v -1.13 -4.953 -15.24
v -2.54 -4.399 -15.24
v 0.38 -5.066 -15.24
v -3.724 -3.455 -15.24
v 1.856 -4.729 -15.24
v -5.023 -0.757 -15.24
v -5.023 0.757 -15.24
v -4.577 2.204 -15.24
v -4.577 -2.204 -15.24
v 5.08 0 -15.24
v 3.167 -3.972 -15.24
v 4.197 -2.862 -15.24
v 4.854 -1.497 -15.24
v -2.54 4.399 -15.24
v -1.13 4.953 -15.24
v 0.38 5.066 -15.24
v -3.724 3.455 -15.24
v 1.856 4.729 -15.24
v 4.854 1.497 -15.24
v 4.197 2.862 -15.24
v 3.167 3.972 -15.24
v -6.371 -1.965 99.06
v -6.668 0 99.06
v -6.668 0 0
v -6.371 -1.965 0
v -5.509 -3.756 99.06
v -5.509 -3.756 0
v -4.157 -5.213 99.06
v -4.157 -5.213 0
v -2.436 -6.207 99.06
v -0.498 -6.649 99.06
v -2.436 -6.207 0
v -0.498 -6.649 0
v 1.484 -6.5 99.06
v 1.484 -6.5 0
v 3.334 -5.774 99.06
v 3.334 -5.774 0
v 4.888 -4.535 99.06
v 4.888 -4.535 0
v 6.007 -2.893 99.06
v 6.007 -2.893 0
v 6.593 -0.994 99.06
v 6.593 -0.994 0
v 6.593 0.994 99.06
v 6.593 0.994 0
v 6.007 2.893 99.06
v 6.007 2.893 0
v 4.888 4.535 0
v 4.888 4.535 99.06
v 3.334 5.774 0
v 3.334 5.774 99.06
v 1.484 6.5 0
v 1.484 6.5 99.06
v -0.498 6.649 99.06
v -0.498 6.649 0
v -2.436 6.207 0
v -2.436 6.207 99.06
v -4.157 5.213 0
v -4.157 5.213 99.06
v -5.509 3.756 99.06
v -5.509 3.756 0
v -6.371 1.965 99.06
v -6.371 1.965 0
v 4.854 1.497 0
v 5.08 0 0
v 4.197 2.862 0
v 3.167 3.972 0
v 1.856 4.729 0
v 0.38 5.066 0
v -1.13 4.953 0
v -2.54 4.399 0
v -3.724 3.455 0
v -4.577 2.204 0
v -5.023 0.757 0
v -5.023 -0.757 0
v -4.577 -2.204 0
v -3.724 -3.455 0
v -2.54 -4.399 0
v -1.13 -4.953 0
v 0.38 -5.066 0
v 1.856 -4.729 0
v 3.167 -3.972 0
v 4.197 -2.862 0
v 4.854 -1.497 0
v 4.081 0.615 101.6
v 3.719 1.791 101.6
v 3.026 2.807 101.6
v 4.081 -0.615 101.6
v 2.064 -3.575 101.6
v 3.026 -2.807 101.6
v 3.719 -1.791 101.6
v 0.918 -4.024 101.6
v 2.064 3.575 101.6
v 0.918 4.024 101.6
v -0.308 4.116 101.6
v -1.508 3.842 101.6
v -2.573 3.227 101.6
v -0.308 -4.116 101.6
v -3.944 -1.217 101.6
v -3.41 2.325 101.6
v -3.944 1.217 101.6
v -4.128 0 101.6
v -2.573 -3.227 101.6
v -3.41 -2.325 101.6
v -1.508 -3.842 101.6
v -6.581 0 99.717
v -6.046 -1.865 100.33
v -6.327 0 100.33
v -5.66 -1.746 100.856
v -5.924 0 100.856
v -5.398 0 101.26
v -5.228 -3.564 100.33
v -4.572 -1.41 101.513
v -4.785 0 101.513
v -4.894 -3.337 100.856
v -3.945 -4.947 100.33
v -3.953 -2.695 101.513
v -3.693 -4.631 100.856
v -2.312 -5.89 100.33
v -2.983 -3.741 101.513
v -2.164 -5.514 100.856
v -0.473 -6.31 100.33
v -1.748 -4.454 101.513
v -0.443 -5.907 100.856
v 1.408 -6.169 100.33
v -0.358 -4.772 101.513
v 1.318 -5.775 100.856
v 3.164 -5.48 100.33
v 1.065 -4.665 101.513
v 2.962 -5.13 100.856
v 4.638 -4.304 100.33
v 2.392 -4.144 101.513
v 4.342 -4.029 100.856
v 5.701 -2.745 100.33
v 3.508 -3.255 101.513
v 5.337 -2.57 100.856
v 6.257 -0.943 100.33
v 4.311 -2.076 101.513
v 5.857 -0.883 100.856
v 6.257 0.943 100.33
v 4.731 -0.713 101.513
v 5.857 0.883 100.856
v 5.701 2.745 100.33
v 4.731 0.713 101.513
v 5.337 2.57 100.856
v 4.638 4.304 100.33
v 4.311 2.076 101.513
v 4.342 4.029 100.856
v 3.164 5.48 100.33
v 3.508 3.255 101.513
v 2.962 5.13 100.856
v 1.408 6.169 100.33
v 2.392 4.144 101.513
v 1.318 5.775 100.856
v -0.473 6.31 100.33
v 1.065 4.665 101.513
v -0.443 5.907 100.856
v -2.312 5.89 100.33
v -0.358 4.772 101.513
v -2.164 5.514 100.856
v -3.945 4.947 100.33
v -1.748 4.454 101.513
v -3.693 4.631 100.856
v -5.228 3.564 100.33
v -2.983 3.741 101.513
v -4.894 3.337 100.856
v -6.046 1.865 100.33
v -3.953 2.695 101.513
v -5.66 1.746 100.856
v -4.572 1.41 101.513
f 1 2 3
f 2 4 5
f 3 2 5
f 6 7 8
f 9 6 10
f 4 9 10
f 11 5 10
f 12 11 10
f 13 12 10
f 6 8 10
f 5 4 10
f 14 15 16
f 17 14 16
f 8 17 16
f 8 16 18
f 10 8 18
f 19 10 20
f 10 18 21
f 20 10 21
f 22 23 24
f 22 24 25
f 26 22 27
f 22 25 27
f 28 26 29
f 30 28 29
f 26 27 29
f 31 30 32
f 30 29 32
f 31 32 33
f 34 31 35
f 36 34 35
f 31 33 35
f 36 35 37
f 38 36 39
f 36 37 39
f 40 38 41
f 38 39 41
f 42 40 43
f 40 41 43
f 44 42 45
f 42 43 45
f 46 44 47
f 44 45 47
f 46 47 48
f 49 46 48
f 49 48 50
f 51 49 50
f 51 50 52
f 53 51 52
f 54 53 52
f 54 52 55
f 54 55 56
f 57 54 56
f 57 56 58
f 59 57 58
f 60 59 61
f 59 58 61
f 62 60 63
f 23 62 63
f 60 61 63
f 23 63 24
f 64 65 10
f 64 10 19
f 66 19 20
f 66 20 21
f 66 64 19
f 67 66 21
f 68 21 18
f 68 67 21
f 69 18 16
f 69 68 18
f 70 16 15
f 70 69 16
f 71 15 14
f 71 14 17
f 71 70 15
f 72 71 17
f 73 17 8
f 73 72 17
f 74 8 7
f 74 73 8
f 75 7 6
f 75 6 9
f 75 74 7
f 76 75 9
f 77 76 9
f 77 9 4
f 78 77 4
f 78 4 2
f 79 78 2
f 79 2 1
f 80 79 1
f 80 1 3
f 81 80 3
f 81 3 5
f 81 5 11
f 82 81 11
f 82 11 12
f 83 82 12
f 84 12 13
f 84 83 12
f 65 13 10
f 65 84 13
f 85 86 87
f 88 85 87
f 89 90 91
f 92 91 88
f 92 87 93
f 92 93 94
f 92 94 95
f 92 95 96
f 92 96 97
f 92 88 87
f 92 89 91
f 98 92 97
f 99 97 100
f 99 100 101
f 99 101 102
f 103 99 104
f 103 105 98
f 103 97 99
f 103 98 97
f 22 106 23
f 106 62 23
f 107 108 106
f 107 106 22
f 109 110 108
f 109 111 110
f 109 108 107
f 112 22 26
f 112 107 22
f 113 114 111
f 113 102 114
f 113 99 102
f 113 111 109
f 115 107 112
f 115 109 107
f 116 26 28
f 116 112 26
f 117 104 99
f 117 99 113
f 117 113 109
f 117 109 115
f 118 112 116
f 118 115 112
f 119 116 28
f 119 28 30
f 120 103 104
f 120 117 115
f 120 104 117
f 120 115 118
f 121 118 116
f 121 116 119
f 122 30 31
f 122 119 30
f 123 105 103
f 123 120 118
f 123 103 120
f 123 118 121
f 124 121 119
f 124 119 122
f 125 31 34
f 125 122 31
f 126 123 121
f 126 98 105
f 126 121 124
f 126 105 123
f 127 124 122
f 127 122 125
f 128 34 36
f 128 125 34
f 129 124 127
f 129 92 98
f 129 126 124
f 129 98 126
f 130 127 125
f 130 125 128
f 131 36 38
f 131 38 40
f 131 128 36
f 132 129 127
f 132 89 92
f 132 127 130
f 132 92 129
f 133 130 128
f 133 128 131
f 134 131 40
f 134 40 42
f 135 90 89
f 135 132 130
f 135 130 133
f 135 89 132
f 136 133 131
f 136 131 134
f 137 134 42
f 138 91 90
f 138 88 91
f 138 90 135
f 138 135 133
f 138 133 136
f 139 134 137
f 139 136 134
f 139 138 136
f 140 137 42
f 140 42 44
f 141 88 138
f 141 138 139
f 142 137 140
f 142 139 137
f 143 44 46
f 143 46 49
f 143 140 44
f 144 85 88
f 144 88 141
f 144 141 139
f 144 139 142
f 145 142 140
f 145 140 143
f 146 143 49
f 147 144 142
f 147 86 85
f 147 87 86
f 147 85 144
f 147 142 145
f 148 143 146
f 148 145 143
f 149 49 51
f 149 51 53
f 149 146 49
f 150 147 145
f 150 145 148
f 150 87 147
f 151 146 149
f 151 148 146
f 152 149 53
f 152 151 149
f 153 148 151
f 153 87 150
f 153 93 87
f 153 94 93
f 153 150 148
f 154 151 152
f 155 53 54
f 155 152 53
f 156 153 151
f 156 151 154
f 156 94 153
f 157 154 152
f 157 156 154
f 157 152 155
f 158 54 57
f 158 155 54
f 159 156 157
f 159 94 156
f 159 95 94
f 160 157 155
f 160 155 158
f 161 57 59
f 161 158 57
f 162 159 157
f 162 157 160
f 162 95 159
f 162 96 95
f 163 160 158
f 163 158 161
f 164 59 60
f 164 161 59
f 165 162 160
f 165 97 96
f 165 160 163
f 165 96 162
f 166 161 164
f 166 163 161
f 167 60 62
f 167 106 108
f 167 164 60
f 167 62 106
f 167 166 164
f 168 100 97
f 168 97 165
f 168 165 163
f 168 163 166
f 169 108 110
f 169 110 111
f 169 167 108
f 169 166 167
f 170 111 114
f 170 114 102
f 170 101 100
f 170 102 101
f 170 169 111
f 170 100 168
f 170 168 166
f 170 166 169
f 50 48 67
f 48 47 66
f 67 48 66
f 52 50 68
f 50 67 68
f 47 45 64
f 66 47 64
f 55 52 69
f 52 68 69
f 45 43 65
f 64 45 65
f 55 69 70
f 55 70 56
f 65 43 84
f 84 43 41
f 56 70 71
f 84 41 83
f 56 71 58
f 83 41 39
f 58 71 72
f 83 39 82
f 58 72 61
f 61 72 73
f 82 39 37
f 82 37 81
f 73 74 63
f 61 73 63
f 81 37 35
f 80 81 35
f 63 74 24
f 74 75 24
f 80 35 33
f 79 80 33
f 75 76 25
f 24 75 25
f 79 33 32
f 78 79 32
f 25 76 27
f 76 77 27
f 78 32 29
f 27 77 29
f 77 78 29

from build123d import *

# Parameters (mm, degrees)
SKETCH1_R           = 5.08
BOSS_EXTRUDE1_DEPTH = 15.24
SKETCH2_R           = 6.6675
BOSS_EXTRUDE2_DEPTH = 101.6
FILLET1_R           = 2.54


with BuildPart() as part:
    # Sketch1 → Boss-Extrude1 (new body)
    with BuildSketch(Plane.XY):
        Circle(SKETCH1_R)
    extrude(amount=-BOSS_EXTRUDE1_DEPTH)

    # Sketch2 → Boss-Extrude2 (add)
    with BuildSketch(Plane.XY):
        with Locations(Location((0, 0, 0), (0, 0, 180))):
            Circle(SKETCH2_R)
    extrude(amount=BOSS_EXTRUDE2_DEPTH)

    # Fillet1
    fillet1_edges = [part.edges().sort_by_distance(p)[0] for p in [
        (6.6675, 0, 101.6),
    ]]
    fillet(fillet1_edges, radius=FILLET1_R)


solid = part.part
